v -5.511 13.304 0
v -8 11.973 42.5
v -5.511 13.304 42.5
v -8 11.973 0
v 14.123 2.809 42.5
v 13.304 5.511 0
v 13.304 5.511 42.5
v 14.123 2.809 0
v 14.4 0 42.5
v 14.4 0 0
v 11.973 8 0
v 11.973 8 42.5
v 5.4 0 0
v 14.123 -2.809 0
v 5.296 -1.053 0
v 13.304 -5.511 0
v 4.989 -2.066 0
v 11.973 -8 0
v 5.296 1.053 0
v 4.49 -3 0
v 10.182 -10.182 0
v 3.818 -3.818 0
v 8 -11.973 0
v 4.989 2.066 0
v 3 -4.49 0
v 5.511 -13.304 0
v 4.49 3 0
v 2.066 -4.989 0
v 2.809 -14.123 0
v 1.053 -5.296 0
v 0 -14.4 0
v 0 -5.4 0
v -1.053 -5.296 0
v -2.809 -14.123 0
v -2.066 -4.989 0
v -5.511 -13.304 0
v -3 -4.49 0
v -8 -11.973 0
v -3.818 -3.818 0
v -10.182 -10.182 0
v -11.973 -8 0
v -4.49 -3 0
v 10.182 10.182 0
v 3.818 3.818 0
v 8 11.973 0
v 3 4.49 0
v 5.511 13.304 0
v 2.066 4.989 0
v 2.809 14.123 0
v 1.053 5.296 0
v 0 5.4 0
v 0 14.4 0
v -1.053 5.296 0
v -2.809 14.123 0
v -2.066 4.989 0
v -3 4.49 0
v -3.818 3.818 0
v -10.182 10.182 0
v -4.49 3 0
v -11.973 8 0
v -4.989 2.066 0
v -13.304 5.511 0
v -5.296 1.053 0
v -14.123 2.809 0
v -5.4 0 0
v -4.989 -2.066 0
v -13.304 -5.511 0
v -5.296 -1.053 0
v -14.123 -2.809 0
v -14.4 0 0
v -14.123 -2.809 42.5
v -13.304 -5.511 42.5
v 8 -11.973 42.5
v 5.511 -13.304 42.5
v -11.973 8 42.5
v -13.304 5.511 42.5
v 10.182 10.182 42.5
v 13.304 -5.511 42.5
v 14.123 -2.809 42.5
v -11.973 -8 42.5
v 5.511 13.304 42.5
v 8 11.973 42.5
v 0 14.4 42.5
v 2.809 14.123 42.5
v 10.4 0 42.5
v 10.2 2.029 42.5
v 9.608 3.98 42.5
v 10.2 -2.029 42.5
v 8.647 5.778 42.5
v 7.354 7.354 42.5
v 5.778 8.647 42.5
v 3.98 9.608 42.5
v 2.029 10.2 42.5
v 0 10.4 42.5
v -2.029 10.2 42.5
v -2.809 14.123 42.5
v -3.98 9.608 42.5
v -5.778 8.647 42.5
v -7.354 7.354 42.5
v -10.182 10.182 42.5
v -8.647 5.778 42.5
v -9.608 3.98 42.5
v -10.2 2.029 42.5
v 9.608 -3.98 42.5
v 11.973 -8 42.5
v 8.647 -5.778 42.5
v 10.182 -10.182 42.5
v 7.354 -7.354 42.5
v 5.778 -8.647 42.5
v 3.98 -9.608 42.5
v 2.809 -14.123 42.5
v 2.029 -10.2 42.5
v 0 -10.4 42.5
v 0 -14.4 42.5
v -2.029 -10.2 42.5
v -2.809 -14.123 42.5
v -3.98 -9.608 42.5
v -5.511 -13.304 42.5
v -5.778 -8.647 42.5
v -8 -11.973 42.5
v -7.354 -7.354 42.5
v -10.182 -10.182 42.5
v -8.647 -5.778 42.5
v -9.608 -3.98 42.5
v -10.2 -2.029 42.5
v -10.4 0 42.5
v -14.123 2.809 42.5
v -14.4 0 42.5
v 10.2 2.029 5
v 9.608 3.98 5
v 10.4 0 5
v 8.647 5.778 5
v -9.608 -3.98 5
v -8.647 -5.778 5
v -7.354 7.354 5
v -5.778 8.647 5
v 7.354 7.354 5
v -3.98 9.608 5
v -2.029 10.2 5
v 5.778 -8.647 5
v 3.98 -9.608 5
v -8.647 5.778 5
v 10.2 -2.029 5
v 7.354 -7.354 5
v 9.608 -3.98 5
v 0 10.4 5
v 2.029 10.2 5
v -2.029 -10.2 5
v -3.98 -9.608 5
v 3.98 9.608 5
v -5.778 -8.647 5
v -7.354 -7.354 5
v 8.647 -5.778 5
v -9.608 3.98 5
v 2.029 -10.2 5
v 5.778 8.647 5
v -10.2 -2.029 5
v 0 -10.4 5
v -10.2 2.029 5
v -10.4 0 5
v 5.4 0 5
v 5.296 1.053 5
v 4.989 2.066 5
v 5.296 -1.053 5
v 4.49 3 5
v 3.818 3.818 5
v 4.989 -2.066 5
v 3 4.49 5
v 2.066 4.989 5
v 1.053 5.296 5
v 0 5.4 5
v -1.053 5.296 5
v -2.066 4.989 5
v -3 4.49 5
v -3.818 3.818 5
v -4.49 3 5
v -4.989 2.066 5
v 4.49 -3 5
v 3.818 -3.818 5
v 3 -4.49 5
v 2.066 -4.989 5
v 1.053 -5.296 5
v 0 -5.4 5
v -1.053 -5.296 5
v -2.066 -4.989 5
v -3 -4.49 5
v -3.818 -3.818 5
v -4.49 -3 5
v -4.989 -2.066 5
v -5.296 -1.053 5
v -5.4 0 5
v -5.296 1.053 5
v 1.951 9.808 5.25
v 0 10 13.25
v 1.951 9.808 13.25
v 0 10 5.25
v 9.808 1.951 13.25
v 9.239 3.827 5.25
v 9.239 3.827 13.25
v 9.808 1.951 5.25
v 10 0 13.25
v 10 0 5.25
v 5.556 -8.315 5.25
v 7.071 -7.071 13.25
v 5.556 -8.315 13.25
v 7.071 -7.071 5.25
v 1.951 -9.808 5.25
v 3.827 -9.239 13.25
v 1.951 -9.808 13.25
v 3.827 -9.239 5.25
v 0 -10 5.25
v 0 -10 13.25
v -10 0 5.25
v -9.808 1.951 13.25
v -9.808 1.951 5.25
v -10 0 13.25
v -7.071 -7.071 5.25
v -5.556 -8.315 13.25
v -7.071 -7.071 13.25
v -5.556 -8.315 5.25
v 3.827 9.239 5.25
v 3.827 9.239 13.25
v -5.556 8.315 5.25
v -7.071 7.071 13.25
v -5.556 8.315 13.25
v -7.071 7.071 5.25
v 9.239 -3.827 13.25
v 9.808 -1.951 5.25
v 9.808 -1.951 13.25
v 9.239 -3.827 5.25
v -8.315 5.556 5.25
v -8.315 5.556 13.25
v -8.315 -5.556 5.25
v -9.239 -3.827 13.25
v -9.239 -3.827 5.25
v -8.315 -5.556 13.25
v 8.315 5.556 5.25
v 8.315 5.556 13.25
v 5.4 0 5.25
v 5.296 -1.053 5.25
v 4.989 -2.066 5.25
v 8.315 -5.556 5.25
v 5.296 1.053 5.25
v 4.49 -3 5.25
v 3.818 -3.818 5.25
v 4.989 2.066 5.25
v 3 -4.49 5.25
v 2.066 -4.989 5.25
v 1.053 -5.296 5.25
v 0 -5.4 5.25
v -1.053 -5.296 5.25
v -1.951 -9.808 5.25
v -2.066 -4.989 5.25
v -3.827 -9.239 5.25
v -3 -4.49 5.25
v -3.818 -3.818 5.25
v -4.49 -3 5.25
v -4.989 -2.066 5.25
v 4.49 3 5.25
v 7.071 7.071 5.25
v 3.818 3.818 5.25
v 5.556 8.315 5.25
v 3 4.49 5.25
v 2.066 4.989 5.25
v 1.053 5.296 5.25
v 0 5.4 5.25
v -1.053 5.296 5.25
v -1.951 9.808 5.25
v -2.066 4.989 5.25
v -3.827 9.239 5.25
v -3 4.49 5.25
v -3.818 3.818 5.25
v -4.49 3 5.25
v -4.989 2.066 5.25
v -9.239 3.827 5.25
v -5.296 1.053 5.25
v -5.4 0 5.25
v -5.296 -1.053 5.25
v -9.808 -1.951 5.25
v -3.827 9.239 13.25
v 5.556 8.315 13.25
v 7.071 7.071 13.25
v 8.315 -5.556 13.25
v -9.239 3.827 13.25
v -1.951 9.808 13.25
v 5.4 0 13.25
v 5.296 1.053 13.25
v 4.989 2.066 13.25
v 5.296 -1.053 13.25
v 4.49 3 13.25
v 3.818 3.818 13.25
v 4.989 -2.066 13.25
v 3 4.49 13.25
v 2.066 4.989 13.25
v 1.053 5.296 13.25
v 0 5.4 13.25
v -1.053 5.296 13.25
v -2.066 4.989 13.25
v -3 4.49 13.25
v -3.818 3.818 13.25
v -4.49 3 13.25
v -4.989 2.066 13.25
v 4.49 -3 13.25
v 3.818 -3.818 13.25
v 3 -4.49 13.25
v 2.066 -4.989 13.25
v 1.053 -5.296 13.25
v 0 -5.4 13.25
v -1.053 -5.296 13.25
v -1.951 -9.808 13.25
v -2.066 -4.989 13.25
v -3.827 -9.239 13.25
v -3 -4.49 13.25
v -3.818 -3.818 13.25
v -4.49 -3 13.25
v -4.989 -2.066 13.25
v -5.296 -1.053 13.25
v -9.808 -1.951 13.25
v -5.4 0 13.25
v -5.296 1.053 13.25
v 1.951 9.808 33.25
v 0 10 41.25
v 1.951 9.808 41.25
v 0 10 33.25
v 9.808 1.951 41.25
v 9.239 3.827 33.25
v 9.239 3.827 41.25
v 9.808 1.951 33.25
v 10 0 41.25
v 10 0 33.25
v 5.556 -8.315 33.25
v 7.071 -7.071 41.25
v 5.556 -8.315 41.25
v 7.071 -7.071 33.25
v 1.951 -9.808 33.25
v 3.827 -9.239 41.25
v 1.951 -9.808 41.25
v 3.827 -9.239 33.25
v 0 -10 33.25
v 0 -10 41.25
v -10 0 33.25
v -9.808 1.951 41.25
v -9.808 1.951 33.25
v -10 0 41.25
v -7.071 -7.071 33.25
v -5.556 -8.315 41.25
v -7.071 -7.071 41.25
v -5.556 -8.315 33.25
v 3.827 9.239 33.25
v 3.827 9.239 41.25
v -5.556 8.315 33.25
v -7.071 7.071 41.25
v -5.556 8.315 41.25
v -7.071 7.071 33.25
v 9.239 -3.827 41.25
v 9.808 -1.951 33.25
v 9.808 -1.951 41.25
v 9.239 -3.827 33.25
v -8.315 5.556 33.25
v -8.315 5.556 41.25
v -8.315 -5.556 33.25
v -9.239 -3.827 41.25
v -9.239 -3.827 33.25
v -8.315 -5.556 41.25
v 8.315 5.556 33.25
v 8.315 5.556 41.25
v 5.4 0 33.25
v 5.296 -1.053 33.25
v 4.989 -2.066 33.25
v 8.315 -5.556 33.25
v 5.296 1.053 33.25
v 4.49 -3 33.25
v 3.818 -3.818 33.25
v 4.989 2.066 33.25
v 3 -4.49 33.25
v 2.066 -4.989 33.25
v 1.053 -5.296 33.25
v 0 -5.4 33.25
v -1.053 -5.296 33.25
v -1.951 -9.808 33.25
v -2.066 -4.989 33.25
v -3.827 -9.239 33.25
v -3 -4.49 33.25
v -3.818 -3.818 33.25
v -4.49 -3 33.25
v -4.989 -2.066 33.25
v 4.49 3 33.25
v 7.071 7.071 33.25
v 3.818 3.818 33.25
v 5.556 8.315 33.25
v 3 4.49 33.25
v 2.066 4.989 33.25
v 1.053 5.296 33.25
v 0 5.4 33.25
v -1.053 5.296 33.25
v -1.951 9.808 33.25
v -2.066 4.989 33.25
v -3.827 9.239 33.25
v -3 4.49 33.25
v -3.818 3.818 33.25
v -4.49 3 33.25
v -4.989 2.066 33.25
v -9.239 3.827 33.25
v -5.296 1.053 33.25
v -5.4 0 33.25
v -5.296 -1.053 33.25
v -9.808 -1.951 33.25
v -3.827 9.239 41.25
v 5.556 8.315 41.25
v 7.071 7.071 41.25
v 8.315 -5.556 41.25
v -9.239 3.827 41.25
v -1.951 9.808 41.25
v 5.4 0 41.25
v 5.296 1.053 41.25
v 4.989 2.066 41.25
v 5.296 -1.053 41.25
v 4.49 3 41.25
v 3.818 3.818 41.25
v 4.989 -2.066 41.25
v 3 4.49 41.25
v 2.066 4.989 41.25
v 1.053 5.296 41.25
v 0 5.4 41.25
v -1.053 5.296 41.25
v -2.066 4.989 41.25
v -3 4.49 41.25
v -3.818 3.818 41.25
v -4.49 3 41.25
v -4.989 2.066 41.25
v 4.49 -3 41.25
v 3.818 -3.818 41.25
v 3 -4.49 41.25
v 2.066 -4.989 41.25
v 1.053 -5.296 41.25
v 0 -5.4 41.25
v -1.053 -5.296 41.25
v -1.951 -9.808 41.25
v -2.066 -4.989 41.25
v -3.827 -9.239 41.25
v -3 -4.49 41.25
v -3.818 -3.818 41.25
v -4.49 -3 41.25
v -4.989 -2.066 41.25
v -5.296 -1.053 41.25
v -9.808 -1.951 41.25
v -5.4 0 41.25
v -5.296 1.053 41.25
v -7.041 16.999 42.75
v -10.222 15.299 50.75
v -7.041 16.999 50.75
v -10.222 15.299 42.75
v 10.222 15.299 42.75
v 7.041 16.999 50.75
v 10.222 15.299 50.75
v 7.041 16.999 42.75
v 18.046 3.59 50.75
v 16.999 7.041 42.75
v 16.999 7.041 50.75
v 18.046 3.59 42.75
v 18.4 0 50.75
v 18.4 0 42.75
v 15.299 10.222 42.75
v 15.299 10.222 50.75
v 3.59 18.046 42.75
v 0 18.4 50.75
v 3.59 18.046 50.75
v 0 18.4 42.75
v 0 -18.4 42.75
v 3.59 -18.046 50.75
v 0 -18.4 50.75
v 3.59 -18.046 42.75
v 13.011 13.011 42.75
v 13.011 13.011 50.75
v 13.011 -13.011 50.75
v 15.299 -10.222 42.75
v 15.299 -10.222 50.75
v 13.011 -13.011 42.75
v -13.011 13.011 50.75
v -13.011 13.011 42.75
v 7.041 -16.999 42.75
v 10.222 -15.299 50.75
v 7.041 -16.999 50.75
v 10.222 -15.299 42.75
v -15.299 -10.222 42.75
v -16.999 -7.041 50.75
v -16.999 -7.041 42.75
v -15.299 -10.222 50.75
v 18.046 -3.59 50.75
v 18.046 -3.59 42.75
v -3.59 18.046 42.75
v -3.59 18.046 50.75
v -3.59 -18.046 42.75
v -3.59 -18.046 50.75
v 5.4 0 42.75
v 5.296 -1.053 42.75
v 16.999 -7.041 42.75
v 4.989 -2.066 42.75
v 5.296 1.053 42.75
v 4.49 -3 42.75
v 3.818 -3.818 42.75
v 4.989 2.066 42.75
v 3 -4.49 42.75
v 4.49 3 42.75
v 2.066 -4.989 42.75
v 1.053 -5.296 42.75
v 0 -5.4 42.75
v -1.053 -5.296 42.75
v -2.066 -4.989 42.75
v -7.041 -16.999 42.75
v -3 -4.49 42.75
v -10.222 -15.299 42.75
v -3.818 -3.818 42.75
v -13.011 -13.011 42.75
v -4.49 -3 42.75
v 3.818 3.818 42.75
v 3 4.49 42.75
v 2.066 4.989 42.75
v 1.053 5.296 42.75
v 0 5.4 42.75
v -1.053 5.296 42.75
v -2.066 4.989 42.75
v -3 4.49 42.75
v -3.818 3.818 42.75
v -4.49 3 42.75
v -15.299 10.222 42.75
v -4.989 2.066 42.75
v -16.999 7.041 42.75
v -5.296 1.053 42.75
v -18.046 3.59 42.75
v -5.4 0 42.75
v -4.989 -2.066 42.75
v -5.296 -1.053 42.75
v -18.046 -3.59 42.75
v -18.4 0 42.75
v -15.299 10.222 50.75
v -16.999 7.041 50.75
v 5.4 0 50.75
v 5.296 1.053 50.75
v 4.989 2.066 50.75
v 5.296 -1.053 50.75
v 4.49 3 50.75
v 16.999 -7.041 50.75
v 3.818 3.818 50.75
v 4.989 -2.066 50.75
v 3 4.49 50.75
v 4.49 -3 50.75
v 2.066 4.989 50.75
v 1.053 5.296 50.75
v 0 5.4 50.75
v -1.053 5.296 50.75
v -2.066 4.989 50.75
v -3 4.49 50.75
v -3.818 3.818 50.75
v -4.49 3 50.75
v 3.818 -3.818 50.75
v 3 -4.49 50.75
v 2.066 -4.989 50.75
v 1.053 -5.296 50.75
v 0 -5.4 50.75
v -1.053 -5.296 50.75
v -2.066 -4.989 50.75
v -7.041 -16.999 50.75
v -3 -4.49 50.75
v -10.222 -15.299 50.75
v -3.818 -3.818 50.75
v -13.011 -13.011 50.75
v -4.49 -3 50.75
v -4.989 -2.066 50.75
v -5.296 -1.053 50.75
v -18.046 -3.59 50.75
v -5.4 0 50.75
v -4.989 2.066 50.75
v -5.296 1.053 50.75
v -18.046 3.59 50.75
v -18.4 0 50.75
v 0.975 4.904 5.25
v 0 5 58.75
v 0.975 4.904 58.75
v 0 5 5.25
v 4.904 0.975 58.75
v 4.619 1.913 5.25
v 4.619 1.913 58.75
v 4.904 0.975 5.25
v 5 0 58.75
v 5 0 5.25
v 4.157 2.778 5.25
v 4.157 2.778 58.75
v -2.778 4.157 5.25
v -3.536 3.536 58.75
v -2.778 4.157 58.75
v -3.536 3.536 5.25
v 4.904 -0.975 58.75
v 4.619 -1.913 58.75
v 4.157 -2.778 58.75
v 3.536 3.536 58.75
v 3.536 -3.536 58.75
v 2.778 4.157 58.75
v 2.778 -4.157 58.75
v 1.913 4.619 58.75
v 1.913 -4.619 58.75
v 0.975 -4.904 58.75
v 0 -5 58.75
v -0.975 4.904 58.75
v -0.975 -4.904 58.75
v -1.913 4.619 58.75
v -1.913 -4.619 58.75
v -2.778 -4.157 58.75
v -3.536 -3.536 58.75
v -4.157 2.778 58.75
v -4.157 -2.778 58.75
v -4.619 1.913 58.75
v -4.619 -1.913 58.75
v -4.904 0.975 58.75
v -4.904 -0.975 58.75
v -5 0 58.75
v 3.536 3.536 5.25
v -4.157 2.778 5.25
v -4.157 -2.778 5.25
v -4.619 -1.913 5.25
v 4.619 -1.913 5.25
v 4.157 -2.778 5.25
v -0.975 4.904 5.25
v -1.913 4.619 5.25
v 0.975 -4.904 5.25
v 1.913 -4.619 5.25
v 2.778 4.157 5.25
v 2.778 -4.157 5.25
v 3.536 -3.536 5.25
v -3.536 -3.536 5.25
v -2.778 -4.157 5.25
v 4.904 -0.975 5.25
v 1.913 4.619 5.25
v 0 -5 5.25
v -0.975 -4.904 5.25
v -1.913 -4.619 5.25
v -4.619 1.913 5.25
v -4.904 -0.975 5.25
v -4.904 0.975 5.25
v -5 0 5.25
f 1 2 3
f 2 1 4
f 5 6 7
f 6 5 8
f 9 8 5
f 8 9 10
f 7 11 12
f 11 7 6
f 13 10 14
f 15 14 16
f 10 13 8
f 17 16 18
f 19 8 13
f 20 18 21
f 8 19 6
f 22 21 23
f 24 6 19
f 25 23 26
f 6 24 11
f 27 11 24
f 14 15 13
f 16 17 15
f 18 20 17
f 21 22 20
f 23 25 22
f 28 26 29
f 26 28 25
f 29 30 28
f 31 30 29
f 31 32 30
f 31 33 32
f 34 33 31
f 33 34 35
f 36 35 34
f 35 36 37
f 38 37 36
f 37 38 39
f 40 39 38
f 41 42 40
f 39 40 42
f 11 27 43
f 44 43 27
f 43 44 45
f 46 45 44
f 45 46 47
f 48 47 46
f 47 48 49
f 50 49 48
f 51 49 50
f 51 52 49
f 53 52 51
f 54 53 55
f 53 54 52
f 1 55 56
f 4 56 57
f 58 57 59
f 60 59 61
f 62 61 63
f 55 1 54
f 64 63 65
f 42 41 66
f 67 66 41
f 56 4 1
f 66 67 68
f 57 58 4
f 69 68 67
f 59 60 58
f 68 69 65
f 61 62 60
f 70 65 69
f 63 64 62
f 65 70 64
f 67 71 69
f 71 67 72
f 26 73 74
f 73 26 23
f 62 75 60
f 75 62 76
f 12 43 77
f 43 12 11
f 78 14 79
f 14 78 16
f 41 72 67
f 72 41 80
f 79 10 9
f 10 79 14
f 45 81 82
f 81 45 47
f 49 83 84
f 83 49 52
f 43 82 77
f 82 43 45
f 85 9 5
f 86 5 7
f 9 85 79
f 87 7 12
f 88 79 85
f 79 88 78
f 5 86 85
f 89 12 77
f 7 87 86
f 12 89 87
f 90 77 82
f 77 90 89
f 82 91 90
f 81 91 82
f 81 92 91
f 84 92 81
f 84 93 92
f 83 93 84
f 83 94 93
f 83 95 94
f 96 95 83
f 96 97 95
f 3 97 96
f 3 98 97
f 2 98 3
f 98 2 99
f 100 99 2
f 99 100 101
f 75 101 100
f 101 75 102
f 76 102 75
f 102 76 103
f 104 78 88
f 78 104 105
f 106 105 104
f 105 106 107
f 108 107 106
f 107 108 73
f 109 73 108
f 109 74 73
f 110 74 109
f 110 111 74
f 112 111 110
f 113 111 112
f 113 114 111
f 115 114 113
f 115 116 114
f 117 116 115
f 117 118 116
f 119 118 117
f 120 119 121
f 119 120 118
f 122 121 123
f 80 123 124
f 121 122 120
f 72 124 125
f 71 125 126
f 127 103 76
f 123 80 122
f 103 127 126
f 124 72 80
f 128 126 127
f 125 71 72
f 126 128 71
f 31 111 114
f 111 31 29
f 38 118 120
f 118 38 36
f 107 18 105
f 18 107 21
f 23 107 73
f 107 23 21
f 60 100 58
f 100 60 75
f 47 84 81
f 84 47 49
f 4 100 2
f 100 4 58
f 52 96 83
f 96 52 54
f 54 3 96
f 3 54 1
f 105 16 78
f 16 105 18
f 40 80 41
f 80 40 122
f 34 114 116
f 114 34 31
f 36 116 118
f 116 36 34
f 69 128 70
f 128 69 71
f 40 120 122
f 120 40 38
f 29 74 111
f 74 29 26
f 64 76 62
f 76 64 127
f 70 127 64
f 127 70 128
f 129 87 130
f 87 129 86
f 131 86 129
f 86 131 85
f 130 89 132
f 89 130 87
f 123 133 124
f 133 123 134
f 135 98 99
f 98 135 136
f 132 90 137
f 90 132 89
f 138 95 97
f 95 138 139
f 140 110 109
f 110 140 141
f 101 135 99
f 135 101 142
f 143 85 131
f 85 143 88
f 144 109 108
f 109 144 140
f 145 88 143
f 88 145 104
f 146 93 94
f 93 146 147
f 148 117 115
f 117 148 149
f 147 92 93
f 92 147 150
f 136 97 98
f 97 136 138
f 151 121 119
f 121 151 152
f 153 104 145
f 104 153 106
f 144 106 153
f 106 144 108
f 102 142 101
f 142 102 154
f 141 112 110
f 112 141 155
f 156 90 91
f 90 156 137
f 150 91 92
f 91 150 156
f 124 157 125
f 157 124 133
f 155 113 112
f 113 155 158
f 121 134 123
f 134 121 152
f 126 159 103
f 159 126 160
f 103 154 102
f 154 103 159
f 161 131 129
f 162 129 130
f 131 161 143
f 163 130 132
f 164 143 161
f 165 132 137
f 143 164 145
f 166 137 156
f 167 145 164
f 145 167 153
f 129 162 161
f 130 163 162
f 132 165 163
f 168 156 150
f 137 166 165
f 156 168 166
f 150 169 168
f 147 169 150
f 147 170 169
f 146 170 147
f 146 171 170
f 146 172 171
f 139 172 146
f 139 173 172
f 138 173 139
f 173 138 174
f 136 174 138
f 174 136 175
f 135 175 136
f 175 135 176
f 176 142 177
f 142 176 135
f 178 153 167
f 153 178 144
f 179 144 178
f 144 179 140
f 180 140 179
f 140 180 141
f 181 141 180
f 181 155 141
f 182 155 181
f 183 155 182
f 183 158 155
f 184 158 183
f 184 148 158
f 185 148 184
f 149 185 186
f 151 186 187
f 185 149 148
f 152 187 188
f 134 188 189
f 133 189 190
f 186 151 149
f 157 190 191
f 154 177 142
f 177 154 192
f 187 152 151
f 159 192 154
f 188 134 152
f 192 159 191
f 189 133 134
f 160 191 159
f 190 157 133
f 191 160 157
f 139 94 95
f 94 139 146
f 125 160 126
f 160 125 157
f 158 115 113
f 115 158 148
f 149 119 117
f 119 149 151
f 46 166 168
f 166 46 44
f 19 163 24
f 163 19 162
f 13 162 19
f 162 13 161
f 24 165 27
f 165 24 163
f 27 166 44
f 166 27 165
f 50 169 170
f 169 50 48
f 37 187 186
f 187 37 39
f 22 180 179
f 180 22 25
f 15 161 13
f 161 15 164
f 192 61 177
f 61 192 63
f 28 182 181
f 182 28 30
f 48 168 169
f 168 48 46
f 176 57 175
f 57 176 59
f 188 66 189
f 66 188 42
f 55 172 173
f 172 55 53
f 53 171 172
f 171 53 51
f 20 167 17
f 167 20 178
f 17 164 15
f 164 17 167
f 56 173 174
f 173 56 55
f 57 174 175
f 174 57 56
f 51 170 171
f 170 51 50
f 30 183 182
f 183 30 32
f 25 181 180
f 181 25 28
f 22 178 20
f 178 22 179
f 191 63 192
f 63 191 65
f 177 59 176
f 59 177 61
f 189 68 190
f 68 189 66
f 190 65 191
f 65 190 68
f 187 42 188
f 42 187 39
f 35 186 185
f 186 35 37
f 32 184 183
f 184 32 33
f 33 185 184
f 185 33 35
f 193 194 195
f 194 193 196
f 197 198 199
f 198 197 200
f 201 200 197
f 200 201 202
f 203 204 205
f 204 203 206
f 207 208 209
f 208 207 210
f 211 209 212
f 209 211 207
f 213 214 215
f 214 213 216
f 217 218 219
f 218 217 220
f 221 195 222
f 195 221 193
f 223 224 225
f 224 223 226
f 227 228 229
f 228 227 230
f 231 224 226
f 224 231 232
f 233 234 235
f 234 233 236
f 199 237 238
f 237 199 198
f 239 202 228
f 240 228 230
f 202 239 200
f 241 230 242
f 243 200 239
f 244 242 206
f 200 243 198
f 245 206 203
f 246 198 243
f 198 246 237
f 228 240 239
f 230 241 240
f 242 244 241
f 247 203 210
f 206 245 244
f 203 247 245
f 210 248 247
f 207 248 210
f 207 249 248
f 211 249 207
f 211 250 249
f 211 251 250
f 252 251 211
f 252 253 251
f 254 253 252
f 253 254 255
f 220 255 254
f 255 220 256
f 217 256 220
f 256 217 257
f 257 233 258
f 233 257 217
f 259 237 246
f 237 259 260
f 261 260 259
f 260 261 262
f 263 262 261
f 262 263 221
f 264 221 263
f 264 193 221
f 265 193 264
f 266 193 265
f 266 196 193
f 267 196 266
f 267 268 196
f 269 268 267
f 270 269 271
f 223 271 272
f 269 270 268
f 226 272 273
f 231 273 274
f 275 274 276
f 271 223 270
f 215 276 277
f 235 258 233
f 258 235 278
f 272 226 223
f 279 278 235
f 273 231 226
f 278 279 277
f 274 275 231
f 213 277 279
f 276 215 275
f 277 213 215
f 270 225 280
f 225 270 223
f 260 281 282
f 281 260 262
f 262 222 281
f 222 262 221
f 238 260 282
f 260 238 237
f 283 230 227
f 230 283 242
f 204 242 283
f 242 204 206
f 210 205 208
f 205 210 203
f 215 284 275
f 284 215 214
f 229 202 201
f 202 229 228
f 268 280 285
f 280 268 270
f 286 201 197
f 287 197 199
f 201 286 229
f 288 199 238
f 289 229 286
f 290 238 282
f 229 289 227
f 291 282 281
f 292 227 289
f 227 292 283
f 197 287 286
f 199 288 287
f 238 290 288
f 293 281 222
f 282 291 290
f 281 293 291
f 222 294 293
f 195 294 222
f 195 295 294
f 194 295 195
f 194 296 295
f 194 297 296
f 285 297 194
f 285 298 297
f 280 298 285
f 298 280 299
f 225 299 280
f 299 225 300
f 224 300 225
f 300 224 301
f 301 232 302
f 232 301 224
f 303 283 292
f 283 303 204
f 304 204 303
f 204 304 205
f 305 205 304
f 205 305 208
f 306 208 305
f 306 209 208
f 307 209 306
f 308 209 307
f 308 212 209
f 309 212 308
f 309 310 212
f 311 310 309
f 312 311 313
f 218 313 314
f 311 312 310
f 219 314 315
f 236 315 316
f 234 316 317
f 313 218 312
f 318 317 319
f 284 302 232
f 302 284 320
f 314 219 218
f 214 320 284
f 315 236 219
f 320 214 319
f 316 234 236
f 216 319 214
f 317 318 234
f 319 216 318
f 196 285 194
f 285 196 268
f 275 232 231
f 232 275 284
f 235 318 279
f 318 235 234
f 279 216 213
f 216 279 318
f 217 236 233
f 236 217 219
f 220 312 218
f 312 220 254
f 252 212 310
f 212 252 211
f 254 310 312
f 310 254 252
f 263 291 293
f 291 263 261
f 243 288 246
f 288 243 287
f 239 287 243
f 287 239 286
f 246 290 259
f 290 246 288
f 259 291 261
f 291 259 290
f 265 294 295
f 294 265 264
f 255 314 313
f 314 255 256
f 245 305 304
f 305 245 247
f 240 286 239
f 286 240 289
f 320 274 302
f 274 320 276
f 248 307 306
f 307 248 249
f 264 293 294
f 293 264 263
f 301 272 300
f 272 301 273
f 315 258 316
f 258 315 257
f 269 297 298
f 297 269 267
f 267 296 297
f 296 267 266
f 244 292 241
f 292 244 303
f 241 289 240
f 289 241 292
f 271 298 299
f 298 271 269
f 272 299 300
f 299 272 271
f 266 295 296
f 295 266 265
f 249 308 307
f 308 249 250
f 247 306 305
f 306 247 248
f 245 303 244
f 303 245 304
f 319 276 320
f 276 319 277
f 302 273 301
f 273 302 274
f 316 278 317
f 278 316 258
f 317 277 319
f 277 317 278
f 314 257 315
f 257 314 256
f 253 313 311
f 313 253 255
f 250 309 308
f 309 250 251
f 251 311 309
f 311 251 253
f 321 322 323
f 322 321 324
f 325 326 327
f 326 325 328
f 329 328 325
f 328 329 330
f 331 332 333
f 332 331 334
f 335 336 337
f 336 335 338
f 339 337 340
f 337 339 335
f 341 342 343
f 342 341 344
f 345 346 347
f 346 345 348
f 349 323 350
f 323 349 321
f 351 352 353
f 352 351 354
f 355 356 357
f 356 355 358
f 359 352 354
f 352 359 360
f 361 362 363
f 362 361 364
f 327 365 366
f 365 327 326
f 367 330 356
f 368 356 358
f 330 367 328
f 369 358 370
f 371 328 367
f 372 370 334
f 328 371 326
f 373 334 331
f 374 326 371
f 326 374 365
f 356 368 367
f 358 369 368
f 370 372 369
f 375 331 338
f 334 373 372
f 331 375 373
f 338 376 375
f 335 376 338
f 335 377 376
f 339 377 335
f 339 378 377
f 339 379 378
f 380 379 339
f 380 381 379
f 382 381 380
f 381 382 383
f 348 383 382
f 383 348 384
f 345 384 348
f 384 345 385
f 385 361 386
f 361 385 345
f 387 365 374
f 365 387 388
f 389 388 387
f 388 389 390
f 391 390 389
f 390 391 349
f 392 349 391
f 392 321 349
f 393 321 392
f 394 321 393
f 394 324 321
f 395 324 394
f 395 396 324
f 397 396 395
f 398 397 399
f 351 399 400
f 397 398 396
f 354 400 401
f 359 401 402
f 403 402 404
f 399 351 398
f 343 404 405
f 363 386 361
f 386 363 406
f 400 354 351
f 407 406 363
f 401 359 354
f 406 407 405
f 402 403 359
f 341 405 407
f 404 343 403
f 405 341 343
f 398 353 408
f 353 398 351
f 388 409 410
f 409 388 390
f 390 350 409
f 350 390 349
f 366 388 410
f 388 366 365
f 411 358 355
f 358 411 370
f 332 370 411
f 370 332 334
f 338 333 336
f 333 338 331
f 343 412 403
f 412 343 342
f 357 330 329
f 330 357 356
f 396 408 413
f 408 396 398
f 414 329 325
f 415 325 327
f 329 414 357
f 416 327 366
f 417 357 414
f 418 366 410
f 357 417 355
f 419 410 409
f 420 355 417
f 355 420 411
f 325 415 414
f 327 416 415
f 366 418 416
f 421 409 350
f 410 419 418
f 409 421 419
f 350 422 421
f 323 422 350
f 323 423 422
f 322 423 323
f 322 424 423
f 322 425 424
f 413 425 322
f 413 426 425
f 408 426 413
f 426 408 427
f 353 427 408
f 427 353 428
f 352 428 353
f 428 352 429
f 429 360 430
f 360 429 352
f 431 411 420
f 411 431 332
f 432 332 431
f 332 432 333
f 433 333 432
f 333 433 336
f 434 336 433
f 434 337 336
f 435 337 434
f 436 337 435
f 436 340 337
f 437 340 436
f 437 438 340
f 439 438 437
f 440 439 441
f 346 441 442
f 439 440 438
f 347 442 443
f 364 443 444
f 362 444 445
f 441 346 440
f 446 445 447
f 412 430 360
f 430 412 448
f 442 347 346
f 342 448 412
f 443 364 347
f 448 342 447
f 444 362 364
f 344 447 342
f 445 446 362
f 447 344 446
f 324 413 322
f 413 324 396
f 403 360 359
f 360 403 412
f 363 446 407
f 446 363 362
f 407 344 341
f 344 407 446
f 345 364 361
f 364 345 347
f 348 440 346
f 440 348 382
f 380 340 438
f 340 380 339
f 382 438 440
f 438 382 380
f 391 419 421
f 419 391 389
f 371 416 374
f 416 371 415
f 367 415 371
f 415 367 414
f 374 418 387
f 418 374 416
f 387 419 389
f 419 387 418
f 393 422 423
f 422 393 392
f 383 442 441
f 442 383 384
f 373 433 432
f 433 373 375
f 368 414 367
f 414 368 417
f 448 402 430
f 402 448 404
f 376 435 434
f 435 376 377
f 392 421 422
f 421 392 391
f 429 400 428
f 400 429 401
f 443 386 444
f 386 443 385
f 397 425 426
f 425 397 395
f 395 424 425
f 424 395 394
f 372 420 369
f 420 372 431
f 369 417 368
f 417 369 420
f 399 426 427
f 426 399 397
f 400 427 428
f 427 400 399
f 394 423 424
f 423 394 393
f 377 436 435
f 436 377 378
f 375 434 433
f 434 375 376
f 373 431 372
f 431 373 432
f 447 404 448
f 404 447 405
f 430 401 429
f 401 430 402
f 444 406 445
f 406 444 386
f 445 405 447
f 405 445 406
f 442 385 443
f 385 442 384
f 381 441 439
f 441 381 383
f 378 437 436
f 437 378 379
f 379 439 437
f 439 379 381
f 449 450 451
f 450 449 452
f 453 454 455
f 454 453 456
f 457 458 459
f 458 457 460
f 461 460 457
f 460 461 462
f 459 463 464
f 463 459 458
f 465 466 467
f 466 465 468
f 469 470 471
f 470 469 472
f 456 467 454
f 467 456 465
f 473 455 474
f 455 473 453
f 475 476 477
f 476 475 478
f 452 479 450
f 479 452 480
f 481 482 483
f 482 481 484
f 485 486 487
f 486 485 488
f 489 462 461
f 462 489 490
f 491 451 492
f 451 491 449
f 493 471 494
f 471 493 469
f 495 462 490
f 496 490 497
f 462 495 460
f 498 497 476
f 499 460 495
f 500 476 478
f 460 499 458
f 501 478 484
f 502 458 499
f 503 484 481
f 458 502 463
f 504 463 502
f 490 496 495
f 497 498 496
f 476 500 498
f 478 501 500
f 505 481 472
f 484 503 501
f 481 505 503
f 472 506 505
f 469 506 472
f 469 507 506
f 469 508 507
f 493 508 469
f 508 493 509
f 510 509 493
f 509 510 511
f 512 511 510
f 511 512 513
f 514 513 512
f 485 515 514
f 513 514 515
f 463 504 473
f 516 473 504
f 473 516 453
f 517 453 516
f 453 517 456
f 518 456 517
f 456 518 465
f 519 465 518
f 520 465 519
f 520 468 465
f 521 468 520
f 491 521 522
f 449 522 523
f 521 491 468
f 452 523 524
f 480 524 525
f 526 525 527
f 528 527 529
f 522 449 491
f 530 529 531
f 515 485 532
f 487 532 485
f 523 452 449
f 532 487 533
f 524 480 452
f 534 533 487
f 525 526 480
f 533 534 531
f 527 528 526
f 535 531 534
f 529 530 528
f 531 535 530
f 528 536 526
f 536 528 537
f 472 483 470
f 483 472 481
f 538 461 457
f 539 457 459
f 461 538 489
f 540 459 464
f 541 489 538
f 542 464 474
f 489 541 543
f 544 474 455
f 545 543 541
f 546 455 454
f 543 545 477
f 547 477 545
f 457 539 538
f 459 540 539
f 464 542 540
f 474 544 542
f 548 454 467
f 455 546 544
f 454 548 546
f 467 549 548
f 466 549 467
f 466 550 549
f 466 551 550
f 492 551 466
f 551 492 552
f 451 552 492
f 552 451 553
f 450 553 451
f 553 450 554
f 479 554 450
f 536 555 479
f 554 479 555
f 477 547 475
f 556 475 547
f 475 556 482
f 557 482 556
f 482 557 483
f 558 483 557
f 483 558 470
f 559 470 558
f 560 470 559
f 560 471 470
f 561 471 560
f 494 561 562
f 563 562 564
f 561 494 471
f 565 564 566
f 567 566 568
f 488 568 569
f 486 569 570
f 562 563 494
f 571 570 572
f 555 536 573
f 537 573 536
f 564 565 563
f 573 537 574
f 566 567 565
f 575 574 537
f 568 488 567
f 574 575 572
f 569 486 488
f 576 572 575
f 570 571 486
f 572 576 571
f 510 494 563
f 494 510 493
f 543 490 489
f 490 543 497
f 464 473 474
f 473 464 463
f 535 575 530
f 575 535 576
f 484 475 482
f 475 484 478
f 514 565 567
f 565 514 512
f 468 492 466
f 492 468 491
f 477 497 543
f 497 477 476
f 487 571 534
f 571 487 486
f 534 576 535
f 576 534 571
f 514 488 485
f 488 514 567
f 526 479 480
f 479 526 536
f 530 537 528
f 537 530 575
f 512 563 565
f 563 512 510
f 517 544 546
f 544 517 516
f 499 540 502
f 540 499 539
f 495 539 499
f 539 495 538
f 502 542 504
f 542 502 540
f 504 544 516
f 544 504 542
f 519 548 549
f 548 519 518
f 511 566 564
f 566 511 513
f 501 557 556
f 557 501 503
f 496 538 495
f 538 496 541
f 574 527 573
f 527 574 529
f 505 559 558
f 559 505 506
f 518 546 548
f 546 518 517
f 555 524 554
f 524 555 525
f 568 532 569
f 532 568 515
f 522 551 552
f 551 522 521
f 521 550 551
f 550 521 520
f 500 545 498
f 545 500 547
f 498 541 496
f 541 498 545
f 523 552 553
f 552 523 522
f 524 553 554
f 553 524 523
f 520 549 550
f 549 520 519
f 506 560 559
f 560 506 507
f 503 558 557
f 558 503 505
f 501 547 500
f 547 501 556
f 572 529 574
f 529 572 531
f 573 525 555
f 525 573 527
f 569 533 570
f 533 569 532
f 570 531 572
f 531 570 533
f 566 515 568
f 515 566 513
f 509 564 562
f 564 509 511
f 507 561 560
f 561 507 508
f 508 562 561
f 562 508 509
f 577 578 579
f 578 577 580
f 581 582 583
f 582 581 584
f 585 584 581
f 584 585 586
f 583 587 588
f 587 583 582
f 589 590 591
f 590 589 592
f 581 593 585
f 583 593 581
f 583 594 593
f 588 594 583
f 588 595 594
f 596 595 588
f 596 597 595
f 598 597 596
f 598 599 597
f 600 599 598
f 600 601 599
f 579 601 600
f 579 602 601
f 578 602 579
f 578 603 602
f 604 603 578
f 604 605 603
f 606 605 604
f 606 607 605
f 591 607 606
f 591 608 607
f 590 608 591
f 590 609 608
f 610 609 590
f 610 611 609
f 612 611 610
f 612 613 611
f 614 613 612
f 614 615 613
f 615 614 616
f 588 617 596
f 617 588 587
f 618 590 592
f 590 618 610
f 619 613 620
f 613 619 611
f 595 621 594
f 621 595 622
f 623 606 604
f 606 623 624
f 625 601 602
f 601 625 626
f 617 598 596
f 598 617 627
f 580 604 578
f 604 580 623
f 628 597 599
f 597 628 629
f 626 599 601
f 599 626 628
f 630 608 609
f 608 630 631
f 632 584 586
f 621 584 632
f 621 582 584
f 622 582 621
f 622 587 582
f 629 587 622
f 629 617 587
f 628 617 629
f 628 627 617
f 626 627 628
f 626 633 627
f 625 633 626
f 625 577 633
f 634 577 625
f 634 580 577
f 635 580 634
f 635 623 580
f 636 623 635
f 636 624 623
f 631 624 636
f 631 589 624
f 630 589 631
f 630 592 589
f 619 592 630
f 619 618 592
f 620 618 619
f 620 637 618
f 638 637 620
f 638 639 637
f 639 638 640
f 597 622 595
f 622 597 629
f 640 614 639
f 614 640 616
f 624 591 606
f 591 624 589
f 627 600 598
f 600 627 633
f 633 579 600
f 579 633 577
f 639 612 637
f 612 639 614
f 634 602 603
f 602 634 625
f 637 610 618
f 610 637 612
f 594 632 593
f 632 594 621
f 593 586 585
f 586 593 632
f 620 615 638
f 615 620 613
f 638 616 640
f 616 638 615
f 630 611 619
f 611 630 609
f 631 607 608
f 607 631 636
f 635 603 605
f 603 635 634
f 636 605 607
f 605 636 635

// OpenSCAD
$fn = 32;

// ------------------------------------------------------------------------
// Shaft station: cup d28.8 x 42.5 mm, shaft d10
// Every part is its own module, assembly() places every instance.
// ------------------------------------------------------------------------

// --- part 1 ---
module housing_cup() {
  difference() {
    cylinder(h = 42.5, d = 28.8);
    translate([0, 0, 5]) cylinder(h = 38.5, d = 20.8);
    translate([0, 0, -1]) cylinder(h = 7, d = 10.8);
  }
}

// --- part 2 ---
module bearing_lower() {
  difference() {
      translate([0, 0, 0]) cylinder(h = 8, d = 20);
      translate([0, 0, -1]) cylinder(h = 10, d = 10.8);
    }
}

// --- part 3 ---
module bearing_upper() {
  difference() {
      translate([0, 0, 0]) cylinder(h = 8, d = 20);
      translate([0, 0, -1]) cylinder(h = 10, d = 10.8);
    }
}

// --- part 4 ---
module station_shaft() {
  translate([0, 0, -26.75]) cylinder(h = 53.5, d = 10);
}

// --- part 5 ---
module station_cover() {
  difference() {
    cylinder(h = 8, d = 36.8);
    translate([0, 0, -1]) cylinder(h = 10, d = 10.8);
  }
}

// --- assembly ---
module assembly() {
  color([0.80, 0.24, 0.20]) translate([0, 0, 0]) rotate([0, 0, 0]) housing_cup();
  color([0.20, 0.45, 0.75]) translate([0, 0, 5.25]) rotate([0, 0, 0]) bearing_lower();
  color([0.25, 0.62, 0.32]) translate([0, 0, 33.25]) rotate([0, 0, 0]) bearing_upper();
  color([0.92, 0.70, 0.18]) translate([0, 0, 32]) rotate([0, 0, 0]) station_shaft();
  color([0.58, 0.35, 0.70]) translate([0, 0, 42.75]) rotate([0, 0, 0]) station_cover();
}

assembly();
